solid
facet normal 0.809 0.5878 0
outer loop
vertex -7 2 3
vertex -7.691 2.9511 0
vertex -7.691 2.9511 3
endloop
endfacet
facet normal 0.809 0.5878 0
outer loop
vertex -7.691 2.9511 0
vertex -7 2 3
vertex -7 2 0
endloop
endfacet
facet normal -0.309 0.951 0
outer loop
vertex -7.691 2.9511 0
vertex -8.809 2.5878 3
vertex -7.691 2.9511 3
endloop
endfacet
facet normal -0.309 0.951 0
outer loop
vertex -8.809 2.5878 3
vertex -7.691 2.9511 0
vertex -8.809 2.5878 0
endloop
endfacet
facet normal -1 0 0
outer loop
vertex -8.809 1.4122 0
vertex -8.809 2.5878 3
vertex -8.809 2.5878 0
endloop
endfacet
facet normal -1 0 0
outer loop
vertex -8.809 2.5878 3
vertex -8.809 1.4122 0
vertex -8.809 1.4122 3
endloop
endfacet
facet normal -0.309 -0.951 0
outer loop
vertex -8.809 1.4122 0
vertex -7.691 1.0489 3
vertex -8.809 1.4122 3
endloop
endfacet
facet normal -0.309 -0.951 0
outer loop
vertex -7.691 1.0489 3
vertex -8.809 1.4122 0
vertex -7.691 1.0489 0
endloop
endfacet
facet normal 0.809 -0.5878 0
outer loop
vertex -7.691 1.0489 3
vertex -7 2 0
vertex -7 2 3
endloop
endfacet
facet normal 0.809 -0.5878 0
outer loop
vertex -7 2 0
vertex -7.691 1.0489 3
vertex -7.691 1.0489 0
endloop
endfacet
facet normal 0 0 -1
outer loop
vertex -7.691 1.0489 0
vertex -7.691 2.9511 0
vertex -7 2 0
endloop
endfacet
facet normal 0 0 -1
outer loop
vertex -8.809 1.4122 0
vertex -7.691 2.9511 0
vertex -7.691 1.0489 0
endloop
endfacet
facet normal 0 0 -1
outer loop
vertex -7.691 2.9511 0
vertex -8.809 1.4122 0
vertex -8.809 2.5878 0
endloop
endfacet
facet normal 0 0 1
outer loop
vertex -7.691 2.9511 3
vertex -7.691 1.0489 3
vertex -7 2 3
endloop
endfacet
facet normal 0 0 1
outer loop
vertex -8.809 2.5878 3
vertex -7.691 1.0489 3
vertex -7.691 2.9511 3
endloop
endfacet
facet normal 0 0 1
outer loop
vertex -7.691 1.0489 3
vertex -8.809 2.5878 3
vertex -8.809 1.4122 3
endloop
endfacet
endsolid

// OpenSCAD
union() {
  translate([-8, 2, 0]) cylinder(h=3, r=1, center=false);
}
